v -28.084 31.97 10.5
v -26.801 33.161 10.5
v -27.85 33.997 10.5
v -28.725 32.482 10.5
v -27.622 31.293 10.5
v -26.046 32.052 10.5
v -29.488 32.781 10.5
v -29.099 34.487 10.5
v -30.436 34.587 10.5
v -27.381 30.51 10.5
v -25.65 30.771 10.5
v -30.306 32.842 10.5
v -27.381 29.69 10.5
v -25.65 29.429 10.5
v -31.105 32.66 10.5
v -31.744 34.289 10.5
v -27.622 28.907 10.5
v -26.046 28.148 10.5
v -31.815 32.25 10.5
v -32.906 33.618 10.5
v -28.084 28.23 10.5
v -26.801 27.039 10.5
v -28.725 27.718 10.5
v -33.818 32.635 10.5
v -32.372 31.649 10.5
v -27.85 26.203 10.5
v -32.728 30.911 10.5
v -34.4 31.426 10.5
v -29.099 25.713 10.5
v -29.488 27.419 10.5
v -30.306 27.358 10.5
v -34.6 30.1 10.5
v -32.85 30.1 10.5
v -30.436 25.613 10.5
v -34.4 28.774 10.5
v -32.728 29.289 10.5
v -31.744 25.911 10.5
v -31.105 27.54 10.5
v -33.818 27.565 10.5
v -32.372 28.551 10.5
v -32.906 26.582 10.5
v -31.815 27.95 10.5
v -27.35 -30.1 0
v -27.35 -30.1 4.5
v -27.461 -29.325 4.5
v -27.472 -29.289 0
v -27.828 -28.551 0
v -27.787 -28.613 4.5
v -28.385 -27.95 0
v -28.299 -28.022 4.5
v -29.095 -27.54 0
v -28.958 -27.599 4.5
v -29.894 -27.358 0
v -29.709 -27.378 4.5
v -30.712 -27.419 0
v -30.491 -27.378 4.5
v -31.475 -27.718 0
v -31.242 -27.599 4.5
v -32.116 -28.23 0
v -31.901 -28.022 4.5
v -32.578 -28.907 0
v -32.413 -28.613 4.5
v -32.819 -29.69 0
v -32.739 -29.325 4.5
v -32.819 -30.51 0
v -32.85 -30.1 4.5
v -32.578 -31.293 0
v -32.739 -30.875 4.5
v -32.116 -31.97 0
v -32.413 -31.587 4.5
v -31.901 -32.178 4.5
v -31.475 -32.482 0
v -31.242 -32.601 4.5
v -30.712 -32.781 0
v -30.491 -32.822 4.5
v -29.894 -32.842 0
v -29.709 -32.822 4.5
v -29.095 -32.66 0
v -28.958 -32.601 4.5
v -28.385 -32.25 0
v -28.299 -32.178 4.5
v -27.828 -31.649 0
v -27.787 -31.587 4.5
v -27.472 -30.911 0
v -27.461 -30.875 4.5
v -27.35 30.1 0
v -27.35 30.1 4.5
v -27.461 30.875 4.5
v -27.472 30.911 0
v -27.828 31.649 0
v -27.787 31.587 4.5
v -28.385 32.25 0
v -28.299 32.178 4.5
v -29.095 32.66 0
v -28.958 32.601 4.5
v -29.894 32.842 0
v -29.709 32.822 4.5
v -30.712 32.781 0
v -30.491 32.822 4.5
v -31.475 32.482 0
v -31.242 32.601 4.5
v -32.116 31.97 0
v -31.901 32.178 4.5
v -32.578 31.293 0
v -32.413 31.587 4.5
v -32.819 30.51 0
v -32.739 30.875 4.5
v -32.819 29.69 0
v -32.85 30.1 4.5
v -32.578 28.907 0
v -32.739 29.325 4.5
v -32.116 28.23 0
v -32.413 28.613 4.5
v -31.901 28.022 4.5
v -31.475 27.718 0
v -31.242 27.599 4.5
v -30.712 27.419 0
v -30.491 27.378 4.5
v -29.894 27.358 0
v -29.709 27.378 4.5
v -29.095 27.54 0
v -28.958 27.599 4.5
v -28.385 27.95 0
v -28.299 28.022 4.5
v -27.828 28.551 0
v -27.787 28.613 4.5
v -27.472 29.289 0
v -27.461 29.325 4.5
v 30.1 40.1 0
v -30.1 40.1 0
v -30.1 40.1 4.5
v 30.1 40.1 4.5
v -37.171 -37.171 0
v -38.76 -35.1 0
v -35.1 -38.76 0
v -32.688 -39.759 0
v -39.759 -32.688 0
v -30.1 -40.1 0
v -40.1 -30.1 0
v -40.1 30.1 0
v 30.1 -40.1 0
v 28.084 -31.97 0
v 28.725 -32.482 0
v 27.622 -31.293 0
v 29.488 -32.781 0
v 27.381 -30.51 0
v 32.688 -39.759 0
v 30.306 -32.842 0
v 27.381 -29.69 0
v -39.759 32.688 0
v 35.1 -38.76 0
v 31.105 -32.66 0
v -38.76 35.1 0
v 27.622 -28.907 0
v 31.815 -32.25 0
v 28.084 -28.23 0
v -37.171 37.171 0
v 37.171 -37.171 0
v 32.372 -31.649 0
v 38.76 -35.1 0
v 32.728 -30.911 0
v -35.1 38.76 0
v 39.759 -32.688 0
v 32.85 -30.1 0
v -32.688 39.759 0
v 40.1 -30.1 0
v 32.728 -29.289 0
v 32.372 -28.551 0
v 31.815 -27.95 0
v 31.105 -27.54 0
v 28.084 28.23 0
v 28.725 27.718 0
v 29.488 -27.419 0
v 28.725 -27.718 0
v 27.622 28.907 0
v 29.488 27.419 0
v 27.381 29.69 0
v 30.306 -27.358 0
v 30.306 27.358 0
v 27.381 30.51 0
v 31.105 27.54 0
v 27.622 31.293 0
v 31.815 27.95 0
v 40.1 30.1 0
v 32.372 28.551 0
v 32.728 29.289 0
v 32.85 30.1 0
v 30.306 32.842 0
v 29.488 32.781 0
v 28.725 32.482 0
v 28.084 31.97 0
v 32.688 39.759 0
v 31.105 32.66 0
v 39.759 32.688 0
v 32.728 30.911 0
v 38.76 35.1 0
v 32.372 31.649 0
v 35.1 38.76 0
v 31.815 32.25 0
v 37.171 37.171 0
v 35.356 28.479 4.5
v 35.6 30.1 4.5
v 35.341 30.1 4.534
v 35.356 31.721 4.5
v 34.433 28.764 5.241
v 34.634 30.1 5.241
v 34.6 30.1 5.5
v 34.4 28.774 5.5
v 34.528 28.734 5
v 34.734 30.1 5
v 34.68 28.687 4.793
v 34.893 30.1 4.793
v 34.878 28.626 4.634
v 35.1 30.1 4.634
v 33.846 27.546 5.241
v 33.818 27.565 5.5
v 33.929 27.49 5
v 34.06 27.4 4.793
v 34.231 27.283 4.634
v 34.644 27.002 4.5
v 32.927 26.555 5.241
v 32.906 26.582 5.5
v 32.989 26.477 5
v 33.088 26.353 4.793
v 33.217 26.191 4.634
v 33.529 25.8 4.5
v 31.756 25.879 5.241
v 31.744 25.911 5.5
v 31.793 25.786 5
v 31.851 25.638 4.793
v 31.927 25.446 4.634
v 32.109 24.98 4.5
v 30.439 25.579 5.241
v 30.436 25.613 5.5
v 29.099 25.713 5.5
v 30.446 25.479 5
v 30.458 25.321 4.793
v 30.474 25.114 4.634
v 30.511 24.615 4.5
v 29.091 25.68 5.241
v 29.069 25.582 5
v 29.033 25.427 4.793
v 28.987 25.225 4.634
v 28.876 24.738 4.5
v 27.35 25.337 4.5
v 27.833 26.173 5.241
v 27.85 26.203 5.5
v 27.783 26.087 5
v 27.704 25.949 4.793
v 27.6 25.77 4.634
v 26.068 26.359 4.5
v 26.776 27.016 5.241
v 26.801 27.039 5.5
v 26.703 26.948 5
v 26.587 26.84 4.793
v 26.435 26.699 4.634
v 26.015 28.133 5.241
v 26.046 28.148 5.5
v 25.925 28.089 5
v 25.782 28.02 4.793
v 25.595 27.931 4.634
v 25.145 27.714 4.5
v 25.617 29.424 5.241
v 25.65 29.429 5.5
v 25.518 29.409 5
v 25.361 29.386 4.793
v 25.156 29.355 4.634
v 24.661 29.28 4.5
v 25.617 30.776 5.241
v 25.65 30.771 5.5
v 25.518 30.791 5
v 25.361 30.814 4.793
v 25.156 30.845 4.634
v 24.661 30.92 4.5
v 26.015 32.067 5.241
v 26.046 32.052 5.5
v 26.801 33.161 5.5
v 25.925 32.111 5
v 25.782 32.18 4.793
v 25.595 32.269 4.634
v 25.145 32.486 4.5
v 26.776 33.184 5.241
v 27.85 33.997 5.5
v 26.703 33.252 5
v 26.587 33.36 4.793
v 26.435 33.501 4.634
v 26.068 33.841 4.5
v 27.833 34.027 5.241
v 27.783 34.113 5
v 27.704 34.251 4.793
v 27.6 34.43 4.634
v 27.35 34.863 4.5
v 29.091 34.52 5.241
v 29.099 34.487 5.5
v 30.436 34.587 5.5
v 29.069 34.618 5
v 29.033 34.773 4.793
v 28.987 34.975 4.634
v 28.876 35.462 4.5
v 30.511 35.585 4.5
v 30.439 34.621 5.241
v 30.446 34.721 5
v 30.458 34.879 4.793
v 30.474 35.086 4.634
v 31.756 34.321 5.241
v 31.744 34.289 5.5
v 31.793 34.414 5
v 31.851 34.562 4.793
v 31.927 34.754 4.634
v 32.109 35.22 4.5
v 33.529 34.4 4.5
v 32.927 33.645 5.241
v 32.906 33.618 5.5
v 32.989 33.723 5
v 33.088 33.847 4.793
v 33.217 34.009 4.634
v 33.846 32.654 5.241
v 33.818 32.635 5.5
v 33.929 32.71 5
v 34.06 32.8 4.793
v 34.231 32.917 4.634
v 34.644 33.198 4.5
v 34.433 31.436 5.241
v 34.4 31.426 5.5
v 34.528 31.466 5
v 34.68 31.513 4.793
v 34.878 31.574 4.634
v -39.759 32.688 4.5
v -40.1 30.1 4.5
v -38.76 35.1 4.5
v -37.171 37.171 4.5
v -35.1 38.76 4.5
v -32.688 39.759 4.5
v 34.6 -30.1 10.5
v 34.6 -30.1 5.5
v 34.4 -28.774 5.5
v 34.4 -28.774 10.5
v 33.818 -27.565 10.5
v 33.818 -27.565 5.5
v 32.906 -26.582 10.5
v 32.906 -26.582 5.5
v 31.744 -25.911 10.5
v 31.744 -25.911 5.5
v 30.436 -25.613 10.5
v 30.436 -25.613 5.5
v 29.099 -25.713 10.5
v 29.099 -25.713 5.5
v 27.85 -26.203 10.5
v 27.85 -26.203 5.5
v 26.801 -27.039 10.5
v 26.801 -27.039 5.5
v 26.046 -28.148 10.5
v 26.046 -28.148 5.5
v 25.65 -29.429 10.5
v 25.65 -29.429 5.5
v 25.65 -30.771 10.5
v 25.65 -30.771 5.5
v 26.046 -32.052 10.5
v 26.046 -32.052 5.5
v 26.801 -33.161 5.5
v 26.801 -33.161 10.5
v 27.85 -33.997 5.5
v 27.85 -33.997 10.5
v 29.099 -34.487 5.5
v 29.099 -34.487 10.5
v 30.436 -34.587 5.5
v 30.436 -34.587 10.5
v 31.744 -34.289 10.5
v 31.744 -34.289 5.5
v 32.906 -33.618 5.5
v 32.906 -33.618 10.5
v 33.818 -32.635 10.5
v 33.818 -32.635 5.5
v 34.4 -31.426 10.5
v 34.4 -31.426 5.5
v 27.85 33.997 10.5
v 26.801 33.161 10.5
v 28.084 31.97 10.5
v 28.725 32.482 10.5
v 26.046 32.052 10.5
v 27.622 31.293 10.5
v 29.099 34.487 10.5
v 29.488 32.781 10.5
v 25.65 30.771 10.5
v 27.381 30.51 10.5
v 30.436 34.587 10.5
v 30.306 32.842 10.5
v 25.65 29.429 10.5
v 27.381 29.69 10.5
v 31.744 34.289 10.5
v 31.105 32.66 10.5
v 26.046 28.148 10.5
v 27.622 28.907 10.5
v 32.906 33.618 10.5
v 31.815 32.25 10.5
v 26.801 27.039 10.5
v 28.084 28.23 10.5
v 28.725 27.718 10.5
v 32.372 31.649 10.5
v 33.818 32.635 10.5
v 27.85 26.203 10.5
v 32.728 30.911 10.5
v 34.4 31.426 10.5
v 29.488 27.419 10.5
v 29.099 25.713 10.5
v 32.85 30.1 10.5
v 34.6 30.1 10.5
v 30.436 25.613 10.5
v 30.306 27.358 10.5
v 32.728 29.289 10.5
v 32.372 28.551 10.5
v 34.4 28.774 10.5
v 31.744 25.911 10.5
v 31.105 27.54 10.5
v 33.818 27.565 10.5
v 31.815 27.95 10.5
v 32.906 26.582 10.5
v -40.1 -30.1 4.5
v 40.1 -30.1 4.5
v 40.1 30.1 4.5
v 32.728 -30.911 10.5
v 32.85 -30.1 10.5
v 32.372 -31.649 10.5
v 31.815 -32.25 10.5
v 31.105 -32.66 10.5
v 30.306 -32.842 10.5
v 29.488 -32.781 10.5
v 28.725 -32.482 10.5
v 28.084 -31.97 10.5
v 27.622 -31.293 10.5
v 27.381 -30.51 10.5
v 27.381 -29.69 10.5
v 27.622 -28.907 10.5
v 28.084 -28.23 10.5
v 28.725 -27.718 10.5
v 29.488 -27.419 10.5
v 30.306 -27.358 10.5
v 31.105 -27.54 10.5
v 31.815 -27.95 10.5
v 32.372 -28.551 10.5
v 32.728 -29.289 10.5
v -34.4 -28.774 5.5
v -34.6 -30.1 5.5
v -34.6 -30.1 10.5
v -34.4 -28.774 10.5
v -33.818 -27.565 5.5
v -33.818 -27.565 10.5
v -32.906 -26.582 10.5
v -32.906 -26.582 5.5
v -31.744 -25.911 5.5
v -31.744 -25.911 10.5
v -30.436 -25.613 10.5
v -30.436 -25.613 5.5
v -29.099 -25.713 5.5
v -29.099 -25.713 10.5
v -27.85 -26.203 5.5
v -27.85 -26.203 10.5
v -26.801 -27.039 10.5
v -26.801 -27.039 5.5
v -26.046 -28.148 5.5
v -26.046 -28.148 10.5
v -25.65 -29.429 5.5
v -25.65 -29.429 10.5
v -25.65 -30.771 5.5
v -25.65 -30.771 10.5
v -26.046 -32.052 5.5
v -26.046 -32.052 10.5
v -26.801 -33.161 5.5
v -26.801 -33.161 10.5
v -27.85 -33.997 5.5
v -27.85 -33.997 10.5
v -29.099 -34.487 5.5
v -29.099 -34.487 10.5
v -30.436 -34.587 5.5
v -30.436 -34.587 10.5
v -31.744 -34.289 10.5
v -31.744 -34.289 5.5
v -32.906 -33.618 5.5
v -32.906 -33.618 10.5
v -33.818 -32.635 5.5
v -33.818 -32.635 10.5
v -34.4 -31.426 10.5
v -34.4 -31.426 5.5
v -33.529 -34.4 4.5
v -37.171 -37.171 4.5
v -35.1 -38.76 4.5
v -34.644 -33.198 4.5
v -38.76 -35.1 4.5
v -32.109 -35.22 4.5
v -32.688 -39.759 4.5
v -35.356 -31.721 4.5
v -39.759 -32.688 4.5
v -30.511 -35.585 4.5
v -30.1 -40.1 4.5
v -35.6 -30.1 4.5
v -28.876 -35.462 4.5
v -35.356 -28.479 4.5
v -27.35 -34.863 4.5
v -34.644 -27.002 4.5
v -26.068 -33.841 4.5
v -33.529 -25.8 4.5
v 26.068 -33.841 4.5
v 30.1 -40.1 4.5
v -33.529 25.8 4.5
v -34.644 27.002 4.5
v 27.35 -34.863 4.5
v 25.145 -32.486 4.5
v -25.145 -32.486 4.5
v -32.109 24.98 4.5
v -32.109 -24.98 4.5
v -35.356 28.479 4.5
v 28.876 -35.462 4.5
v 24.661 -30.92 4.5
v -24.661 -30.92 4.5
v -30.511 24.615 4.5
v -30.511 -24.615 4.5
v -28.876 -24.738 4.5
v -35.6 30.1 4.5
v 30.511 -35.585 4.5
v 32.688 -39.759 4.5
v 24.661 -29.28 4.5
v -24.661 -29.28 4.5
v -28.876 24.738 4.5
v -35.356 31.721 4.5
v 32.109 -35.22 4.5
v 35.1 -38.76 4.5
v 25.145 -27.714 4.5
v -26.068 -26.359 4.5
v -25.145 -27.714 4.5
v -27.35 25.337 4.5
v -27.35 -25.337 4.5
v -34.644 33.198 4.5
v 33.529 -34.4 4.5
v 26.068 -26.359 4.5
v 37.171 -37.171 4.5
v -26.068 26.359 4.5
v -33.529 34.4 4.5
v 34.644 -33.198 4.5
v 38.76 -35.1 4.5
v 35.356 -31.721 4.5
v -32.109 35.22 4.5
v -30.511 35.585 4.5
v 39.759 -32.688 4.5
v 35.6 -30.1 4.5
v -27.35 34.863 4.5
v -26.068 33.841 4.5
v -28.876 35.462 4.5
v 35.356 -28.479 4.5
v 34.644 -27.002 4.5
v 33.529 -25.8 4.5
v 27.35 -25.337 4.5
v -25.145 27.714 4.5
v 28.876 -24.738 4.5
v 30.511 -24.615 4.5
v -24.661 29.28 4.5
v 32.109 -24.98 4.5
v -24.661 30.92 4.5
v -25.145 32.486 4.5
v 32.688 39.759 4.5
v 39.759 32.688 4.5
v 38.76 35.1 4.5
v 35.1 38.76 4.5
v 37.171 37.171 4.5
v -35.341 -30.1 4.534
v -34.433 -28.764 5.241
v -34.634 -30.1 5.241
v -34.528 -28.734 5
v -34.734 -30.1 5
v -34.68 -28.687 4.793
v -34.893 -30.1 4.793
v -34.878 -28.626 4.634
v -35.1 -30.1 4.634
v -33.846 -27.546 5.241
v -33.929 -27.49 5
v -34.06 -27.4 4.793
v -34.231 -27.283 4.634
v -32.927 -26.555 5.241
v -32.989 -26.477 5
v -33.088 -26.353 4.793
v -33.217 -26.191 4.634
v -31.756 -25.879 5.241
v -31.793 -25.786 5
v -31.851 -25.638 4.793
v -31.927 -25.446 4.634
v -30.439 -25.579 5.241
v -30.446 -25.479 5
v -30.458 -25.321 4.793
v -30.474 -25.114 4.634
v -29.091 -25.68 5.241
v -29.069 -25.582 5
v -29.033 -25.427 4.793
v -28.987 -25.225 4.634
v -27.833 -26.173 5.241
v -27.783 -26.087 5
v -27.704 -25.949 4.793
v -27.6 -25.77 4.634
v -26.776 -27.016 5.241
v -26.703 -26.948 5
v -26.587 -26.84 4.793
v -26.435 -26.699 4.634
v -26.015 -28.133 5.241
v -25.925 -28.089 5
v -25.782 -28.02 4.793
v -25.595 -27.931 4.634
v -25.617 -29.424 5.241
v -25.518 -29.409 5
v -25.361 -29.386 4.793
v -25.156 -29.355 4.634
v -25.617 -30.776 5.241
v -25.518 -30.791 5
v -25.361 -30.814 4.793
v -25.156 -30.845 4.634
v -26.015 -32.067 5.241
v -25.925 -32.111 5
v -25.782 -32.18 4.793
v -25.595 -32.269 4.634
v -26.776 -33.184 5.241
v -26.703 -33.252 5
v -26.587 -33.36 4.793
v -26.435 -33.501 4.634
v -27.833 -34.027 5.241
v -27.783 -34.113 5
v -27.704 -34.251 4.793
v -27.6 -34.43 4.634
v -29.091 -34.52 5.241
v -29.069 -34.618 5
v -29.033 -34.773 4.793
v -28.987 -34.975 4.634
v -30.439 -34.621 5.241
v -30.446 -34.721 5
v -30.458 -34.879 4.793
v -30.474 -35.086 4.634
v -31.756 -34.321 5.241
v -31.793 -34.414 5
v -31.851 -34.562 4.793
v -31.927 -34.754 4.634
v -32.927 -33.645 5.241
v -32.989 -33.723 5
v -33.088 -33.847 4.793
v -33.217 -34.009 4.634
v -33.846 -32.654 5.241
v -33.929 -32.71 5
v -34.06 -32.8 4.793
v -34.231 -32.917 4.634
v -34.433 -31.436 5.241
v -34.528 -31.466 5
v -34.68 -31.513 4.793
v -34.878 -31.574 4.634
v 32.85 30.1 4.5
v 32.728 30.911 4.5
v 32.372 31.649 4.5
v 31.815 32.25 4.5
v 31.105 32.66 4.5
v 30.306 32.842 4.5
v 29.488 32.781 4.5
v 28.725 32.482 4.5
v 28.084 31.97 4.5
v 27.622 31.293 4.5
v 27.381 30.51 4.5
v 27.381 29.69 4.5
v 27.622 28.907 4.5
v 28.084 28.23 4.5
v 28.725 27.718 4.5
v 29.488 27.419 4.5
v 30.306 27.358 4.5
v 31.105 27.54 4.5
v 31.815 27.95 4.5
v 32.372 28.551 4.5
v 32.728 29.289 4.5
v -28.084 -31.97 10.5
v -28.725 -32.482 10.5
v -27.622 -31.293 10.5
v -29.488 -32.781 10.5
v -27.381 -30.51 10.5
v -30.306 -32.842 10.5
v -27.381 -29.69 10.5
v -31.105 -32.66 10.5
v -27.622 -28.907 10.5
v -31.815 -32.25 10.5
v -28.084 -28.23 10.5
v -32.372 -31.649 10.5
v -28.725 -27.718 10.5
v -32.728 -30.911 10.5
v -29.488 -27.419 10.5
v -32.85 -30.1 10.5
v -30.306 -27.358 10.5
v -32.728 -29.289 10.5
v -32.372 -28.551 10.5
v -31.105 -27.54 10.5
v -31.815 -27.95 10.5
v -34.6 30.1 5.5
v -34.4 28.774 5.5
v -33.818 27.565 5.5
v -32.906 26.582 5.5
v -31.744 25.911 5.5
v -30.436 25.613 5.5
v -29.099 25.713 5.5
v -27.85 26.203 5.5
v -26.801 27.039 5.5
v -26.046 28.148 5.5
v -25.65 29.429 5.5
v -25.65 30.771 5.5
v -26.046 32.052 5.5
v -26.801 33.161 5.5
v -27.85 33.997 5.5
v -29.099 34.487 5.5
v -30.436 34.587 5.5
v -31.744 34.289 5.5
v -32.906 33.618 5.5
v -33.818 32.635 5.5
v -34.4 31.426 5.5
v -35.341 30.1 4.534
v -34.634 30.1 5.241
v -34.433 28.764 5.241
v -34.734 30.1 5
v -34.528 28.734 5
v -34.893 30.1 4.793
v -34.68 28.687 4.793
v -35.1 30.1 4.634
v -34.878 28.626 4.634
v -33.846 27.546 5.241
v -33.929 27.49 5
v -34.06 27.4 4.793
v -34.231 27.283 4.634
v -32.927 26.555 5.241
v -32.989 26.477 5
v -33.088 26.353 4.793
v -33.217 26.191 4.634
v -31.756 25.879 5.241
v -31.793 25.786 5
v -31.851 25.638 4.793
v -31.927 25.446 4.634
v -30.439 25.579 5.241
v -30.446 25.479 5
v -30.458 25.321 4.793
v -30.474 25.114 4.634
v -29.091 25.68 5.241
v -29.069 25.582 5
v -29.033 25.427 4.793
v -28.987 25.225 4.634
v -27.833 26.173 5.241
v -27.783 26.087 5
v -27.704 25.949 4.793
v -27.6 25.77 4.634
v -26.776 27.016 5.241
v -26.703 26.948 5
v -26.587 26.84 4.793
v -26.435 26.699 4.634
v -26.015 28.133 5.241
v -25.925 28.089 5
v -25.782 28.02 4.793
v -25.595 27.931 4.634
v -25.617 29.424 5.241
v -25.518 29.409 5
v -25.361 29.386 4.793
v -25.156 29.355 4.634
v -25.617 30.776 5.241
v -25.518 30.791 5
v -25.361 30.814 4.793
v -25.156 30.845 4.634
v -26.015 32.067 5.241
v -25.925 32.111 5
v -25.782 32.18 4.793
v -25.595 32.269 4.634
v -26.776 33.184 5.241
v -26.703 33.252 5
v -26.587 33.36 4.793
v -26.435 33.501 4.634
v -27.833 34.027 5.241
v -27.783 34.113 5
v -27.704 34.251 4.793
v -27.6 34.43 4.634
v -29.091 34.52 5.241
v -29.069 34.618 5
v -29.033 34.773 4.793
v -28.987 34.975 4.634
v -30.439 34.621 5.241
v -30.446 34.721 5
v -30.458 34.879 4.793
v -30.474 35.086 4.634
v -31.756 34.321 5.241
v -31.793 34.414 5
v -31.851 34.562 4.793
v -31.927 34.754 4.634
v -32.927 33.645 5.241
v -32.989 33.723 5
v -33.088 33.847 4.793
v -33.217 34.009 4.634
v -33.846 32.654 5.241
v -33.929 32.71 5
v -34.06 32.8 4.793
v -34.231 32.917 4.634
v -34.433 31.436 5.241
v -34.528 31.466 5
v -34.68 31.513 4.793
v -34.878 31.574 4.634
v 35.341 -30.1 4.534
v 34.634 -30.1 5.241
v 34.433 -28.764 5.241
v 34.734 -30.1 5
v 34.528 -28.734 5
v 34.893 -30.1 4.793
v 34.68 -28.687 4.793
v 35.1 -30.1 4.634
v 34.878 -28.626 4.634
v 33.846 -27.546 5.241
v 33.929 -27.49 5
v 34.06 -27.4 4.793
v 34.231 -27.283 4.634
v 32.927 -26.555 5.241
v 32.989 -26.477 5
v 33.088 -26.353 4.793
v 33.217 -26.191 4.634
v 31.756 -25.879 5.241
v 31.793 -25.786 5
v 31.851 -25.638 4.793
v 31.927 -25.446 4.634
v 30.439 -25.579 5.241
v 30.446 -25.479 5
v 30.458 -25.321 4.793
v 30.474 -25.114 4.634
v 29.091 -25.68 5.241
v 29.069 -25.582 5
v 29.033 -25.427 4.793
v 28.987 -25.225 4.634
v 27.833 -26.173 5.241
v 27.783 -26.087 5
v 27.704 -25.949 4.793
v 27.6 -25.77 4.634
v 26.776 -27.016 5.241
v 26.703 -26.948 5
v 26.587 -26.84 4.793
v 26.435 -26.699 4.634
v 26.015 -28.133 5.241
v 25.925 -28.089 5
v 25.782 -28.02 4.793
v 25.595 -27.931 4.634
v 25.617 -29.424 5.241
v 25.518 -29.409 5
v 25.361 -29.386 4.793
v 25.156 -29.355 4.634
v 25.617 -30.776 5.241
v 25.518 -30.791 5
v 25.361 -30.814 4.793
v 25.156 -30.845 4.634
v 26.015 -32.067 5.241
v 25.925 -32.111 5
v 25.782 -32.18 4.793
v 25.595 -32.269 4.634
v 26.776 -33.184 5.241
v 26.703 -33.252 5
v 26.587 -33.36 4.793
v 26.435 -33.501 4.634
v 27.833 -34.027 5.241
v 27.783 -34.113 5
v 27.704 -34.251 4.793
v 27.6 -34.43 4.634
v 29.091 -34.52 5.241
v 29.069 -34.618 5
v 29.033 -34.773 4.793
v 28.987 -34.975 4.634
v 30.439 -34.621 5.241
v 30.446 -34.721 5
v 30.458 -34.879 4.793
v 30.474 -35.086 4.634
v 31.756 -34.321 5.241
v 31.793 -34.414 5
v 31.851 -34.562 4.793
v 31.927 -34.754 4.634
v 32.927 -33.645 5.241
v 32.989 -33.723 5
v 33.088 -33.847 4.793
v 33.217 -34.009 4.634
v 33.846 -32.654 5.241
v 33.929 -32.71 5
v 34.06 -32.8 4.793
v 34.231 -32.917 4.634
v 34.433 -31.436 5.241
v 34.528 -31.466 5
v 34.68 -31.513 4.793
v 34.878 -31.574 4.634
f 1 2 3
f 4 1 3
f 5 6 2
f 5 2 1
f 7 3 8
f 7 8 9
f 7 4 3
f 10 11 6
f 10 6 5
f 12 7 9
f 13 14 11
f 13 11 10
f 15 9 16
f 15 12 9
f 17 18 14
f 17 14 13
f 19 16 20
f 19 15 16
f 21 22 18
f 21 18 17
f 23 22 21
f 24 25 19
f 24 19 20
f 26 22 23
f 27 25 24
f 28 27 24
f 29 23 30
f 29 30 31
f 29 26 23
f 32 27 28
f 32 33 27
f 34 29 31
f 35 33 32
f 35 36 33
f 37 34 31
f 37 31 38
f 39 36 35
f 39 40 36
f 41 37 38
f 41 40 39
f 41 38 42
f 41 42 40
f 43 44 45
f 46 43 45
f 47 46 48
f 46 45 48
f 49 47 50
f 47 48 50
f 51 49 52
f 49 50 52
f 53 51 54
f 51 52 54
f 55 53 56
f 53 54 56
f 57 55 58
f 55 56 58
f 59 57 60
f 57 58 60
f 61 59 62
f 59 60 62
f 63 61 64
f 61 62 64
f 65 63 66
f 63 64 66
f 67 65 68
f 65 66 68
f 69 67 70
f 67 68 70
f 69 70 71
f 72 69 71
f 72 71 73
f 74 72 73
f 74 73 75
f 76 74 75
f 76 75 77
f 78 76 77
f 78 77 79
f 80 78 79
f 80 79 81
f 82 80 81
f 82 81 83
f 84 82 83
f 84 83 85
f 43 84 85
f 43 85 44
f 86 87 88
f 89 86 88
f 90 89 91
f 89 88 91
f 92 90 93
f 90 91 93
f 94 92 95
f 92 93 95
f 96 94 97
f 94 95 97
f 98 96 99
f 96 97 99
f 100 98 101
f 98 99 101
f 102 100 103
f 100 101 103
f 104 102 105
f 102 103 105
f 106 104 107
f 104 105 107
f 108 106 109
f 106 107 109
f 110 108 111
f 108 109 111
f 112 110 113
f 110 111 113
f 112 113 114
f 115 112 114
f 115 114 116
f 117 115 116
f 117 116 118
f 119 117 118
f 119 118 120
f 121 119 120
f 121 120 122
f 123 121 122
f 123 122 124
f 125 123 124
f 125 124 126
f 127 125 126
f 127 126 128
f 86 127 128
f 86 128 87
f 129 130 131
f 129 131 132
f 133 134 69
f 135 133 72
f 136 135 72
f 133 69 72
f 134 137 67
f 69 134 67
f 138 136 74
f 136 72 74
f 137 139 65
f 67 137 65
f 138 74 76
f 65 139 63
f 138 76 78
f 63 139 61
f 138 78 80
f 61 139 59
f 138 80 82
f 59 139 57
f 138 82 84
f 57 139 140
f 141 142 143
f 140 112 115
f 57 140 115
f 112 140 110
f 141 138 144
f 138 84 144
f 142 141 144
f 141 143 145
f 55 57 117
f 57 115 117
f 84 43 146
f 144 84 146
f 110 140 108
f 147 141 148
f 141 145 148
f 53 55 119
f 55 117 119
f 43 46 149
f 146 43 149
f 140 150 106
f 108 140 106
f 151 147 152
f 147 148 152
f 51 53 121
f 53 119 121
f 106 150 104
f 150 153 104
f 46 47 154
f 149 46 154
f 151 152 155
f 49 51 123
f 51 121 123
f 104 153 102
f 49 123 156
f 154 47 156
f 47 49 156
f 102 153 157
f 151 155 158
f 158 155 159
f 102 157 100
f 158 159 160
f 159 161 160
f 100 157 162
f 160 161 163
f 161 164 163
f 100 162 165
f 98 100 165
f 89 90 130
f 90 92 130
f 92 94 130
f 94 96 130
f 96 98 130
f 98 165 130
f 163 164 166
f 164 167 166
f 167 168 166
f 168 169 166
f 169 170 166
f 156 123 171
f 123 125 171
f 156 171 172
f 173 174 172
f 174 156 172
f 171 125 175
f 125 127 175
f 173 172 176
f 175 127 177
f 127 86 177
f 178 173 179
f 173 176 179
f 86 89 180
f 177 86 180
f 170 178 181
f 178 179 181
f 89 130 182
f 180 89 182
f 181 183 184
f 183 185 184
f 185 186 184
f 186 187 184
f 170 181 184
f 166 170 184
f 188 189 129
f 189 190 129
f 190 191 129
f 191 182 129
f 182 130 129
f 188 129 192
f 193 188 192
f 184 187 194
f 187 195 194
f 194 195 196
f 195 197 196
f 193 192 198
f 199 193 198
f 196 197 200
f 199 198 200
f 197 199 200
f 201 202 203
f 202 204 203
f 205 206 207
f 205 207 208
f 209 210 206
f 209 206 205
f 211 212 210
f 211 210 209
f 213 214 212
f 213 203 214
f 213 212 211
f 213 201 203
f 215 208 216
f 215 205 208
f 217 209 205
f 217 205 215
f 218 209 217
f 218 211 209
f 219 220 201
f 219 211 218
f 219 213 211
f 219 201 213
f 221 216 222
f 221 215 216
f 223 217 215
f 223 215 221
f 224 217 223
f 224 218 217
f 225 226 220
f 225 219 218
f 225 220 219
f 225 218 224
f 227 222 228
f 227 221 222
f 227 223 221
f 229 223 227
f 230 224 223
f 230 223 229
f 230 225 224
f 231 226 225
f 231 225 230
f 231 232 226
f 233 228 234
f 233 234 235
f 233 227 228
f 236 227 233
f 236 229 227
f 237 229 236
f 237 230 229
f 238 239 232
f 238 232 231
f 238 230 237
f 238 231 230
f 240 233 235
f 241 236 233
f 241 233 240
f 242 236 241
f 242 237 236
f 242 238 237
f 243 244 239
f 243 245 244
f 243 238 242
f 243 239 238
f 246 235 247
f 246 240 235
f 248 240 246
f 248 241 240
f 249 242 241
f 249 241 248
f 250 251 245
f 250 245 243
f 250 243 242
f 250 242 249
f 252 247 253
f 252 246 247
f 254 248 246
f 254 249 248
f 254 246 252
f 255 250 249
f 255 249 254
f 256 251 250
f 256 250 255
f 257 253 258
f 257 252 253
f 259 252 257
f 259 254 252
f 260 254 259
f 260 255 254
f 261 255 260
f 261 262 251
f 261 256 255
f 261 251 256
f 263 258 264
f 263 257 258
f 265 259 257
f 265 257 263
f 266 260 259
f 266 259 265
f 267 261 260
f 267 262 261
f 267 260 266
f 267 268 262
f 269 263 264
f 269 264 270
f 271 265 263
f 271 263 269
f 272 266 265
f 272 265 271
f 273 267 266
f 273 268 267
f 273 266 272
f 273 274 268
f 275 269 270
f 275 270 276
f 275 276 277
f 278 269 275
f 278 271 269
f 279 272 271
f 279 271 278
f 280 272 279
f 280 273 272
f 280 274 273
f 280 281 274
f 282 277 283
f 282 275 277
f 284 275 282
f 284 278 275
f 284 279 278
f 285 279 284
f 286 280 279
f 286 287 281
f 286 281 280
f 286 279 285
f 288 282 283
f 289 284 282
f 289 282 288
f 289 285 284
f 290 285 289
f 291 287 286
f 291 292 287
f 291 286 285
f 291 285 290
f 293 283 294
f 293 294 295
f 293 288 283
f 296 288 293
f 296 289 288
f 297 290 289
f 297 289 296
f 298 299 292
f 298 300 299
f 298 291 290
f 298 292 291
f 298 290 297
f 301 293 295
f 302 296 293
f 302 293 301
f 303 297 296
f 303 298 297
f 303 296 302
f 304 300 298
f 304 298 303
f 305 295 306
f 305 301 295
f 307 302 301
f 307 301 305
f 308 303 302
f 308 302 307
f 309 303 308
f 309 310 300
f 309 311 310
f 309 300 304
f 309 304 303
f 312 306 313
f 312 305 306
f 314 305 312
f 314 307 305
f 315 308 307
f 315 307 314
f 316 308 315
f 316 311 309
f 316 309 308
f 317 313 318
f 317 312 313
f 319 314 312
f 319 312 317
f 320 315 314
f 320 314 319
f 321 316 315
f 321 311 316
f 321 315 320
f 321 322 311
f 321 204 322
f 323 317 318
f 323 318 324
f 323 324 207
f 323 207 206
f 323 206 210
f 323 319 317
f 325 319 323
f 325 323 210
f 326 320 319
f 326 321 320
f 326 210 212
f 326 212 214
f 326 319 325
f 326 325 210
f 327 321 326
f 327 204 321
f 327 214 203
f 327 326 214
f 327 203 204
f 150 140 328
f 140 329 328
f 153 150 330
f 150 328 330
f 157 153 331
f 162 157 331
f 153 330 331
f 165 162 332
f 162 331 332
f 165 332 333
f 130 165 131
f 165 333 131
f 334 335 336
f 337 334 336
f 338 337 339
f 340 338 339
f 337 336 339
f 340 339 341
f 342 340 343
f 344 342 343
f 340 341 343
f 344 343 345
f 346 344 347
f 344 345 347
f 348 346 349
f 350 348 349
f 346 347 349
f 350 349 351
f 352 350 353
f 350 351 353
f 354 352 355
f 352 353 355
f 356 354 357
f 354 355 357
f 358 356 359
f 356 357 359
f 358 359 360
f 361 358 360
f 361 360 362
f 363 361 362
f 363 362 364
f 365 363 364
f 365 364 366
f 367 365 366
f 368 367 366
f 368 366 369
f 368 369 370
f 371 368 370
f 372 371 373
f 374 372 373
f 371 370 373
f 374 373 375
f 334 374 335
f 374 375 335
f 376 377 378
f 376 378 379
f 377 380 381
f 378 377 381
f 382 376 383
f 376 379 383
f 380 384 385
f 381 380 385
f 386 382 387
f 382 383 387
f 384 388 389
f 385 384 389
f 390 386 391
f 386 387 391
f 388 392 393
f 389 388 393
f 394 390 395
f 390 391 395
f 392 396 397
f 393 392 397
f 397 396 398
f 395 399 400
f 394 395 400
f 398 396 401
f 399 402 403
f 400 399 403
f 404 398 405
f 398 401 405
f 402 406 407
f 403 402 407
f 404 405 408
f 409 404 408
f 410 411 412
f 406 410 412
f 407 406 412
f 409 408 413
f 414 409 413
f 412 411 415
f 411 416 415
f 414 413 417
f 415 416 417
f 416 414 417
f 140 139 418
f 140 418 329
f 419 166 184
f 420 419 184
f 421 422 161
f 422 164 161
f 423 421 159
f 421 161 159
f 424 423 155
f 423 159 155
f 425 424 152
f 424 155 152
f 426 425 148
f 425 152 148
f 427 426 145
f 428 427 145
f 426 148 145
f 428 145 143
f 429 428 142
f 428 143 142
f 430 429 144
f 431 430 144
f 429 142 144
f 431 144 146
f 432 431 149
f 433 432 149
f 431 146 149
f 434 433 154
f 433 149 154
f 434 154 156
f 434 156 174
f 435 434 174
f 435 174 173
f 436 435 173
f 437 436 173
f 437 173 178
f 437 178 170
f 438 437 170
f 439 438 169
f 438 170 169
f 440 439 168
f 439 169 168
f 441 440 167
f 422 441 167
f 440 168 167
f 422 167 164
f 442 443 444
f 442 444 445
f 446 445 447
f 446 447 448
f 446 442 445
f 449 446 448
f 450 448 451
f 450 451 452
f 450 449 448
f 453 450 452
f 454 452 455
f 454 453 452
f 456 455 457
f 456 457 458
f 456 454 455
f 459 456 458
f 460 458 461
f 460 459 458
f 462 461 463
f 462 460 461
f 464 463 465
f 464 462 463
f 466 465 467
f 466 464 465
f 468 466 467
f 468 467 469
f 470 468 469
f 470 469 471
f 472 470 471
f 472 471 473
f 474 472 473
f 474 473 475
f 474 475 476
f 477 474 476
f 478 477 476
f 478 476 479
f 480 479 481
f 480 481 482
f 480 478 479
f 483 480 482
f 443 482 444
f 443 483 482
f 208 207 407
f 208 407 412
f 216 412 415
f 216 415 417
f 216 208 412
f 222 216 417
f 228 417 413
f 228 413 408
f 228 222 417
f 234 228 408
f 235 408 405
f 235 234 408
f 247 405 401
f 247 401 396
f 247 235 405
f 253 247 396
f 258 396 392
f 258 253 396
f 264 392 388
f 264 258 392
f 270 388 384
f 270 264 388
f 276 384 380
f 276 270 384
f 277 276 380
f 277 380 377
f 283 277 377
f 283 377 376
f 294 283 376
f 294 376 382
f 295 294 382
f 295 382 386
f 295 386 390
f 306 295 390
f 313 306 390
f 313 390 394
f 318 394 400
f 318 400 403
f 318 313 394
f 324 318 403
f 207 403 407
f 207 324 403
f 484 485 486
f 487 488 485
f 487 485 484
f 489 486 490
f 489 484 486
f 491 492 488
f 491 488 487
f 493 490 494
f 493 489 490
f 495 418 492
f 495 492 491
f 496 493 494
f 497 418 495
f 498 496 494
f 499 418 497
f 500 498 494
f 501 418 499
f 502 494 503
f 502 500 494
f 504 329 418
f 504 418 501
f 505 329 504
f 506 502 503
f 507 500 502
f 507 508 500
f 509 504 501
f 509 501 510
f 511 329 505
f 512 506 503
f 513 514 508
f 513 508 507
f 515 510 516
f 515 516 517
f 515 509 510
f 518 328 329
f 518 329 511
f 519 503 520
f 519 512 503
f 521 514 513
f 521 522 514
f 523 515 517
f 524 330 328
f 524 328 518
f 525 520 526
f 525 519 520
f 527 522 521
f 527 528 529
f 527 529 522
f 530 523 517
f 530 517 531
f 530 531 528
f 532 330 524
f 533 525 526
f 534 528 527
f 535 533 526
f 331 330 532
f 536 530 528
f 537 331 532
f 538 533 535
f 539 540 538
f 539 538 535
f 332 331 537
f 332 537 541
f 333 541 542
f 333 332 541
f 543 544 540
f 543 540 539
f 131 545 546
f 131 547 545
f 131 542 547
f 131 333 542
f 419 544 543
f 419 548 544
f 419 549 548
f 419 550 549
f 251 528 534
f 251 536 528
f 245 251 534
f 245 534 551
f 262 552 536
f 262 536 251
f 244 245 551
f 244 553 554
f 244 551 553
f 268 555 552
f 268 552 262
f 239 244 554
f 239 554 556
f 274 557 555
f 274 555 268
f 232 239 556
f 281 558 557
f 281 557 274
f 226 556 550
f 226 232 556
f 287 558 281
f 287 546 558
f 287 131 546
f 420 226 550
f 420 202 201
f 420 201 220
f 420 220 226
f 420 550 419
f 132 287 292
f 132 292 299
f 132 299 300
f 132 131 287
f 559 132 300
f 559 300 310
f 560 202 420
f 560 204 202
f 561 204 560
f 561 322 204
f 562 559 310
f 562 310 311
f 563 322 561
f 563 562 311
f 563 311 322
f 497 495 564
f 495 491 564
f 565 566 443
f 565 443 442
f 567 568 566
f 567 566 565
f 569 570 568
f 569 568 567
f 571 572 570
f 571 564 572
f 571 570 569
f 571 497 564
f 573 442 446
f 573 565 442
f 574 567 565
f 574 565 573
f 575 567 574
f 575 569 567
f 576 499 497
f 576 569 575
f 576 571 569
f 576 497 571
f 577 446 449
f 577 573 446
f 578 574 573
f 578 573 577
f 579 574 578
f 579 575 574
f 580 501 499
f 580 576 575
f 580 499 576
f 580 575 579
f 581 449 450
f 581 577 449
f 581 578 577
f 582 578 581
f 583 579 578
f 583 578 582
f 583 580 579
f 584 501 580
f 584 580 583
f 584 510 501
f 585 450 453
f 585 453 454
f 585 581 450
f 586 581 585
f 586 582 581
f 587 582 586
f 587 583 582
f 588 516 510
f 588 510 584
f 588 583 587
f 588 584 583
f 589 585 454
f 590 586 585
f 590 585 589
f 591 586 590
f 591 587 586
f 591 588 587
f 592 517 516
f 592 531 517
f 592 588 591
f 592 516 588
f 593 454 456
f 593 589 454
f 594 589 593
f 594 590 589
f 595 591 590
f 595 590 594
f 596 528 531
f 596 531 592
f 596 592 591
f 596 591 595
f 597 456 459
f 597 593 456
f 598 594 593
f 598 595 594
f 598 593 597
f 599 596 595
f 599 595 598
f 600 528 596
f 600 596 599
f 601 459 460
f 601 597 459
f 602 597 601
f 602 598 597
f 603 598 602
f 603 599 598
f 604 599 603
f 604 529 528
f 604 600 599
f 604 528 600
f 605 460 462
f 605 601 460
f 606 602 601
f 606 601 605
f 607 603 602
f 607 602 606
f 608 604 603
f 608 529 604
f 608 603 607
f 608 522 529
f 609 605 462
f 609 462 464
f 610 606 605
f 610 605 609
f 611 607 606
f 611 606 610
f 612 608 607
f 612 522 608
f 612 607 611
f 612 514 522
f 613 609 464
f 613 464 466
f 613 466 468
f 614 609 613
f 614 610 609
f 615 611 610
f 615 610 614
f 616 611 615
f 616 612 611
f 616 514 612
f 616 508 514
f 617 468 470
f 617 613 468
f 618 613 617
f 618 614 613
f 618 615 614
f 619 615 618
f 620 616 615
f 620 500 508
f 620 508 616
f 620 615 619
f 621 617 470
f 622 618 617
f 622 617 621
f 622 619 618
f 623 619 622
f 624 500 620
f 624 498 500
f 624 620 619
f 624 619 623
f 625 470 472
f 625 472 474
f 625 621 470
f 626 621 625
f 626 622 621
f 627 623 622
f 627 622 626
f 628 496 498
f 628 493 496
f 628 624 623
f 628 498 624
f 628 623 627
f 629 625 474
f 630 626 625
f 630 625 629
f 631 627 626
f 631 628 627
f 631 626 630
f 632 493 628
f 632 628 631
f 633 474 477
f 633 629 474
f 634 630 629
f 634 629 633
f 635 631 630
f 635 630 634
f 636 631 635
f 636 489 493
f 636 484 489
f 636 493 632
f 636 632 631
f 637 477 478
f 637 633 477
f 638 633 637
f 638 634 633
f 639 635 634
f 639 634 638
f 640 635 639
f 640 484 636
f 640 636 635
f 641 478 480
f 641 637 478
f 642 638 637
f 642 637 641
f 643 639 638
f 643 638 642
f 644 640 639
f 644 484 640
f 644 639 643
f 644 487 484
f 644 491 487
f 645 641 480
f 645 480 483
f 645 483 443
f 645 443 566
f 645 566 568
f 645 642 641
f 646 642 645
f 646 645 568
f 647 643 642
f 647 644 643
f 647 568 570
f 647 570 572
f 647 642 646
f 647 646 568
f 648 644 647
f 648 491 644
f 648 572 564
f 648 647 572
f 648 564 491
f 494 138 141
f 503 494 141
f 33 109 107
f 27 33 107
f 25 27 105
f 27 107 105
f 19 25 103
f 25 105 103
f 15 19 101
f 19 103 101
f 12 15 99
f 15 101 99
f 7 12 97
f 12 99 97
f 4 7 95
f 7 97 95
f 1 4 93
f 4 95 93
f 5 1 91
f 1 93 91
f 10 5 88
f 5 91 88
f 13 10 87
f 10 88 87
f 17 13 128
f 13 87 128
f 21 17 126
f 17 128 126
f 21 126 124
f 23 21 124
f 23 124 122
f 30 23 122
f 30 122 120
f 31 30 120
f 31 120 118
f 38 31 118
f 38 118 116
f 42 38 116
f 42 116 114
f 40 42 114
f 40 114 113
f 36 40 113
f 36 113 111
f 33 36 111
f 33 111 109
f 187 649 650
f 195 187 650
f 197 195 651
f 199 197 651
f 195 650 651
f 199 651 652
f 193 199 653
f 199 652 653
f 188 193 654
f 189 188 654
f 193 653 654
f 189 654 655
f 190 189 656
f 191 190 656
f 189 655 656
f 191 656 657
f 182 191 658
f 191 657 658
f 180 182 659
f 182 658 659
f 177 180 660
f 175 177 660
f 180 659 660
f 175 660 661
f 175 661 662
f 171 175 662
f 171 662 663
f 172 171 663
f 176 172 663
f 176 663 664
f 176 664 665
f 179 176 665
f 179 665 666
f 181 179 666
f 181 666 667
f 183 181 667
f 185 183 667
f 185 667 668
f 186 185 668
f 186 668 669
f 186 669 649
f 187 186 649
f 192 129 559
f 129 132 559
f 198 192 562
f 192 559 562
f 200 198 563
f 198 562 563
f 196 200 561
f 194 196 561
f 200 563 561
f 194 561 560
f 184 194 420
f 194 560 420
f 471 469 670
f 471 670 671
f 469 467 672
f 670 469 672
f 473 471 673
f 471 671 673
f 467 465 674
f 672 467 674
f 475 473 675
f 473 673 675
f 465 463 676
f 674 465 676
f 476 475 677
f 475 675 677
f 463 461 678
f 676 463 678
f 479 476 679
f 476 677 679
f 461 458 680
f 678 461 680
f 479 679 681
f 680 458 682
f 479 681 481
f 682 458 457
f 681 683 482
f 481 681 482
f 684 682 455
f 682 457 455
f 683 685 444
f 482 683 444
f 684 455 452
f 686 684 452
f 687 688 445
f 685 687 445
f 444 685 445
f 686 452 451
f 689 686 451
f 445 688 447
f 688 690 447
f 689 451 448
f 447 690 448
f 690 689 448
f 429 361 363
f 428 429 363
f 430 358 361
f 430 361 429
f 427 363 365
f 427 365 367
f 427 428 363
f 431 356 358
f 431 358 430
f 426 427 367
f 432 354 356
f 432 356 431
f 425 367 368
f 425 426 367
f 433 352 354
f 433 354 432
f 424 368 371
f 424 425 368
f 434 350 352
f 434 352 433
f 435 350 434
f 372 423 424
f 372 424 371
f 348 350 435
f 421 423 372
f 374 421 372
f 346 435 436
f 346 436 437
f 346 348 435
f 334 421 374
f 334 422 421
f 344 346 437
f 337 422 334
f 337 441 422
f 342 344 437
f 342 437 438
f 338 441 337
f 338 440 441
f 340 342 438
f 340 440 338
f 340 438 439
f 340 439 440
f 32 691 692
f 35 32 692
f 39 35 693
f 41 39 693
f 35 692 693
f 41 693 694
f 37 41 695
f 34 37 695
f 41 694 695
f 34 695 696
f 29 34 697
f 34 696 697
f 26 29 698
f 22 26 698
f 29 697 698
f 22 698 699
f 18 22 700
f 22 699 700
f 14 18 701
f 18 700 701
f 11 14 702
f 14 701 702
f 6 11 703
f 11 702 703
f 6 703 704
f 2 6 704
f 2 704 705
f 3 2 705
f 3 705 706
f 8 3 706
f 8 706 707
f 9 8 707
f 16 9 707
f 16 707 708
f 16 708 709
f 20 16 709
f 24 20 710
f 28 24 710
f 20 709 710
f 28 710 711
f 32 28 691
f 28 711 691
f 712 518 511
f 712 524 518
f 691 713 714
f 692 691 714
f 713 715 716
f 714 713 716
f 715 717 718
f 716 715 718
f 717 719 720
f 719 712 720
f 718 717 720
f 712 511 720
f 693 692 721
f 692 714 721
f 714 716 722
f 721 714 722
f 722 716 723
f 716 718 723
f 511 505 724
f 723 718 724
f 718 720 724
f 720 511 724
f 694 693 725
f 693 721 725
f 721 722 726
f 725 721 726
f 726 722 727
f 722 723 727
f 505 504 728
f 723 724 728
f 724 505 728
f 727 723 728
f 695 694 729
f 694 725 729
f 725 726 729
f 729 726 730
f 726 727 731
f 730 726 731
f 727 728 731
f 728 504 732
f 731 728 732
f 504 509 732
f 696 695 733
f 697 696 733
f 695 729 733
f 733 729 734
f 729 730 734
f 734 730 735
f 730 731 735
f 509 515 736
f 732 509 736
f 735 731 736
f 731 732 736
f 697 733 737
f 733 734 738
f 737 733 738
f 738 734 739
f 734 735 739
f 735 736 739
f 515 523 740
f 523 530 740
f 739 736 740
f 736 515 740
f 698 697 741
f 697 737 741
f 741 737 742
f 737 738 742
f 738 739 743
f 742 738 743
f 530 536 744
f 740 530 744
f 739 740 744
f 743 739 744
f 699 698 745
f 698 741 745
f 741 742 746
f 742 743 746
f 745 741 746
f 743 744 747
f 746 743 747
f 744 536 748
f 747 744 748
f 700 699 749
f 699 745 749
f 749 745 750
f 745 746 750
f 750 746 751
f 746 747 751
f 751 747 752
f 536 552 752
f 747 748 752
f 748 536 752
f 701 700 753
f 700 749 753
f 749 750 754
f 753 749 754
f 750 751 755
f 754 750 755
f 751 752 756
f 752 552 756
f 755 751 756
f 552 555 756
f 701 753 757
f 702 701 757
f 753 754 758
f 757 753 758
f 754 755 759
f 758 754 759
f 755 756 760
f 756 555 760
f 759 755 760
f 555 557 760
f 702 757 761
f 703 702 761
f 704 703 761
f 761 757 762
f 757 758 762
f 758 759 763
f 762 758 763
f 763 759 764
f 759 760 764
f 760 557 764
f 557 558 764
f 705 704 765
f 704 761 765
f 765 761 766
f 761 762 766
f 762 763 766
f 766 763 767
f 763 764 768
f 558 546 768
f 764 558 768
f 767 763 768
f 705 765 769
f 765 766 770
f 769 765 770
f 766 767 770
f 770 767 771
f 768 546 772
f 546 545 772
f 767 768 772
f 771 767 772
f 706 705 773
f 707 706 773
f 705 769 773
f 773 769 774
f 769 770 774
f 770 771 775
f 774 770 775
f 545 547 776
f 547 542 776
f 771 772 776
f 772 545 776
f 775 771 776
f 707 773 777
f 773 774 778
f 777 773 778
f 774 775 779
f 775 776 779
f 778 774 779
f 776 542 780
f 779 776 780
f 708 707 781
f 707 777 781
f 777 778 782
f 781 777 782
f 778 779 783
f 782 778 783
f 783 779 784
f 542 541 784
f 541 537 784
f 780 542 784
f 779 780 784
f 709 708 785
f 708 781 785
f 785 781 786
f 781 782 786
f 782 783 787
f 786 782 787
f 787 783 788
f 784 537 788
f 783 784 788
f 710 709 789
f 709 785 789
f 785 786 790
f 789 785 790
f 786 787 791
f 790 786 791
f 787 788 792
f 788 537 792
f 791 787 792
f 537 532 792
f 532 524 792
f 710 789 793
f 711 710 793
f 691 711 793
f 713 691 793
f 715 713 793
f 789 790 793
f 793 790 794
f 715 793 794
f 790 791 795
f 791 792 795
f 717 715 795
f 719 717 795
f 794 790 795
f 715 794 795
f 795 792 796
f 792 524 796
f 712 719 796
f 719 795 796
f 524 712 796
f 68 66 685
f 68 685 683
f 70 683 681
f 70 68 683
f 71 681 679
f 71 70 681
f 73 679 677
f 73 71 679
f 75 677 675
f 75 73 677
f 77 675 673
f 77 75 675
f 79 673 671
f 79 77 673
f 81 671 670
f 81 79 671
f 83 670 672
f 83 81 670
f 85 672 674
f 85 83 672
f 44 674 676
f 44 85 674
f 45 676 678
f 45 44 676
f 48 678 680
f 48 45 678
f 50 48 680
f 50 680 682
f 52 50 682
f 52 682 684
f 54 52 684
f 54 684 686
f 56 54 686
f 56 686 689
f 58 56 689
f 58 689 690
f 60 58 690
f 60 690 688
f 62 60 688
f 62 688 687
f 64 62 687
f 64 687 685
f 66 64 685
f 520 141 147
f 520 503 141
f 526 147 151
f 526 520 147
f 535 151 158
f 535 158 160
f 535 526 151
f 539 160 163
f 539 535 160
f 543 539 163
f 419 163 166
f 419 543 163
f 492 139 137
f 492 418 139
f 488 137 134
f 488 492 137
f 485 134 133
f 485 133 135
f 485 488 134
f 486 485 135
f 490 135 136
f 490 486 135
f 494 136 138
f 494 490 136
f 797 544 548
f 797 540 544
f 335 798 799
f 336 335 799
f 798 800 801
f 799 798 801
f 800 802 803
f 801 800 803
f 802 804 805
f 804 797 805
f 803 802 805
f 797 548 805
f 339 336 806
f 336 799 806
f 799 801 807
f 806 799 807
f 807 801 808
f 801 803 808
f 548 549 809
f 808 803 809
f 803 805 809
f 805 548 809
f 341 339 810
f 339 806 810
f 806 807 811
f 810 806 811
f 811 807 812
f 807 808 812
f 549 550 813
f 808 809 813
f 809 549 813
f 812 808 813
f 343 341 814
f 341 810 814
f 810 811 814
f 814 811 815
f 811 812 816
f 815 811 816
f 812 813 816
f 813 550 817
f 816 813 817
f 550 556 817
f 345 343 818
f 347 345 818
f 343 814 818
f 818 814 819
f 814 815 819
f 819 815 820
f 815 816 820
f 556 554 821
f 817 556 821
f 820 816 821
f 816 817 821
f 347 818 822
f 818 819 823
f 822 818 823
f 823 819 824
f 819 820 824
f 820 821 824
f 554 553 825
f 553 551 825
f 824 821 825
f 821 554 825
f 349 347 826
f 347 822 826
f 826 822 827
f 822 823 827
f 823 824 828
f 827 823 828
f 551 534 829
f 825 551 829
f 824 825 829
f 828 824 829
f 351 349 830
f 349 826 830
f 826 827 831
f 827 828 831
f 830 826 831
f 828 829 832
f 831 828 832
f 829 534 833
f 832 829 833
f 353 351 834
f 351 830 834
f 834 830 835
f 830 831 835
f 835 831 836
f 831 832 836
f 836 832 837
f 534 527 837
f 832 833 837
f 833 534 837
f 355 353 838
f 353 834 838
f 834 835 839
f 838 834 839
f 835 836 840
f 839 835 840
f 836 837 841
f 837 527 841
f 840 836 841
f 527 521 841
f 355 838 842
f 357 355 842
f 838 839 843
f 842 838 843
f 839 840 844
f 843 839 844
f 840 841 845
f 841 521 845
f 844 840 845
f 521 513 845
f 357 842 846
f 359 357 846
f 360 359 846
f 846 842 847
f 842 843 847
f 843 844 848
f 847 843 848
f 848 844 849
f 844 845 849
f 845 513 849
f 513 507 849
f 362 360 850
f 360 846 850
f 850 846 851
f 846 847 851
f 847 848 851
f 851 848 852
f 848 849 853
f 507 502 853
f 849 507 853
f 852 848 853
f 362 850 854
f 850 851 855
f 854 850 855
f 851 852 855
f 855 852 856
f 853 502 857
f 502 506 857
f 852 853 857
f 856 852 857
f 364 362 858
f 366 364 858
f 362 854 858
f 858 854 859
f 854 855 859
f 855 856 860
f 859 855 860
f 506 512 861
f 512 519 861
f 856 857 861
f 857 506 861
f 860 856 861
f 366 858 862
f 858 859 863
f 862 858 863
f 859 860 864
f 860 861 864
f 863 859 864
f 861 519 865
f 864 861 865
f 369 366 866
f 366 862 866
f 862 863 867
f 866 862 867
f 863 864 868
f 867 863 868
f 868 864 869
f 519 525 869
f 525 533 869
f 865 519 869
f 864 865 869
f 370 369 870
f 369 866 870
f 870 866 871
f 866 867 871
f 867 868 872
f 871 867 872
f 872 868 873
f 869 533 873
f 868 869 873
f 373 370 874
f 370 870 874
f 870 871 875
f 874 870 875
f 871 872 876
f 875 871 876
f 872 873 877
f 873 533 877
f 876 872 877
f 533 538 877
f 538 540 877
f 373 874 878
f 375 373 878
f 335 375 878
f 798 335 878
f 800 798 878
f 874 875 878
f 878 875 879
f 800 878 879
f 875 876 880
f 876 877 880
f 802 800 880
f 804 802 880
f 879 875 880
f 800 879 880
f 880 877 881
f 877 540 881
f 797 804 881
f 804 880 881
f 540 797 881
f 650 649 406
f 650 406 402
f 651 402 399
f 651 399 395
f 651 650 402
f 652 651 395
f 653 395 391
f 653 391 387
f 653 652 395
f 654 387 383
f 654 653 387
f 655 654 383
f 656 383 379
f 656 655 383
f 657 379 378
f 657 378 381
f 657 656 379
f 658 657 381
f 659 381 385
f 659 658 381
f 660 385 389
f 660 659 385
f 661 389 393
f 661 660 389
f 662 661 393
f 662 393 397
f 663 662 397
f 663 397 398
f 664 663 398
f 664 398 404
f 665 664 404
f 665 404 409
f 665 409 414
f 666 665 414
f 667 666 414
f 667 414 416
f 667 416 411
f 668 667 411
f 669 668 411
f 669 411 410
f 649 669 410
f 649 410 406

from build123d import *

# Parameters (mm, degrees)
SKETCH1_W                                  = 80.2
SKETCH1_H                                  = 80.2
BOSS_EXTRUDE1_DEPTH                        = 4.5
M5_CLEARANCE_HOLE1_D                       = 5.5
FILLET2_R                                  = 10
SKETCH3_R                                  = 4.5
BOSS_EXTRUDE2_DEPTH                        = 6
CUT_EXTRUDE1_REACH                         = 59.026
SKETCH5_R                                  = 2.75
MIRROR2_AT_THE_SECOND_PLANE_COPY_1_SKETC_R = 4.5
MIRROR2_AT_THE_SECOND_PLANE_COPY_1_DEPTH   = 6
MIRROR2_AT_THE_SECOND_PLANE_COPY_2_REACH   = 59.026
MIRROR2_AT_THE_SECOND_PLANE_COPY_2_SKETC_R = 2.75
FILLET4_R                                  = 1


with BuildPart() as part:
    # Sketch1 → Boss-Extrude1 (new body)
    with BuildSketch(Plane.XY):
        Rectangle(SKETCH1_W, SKETCH1_H)
    extrude(amount=BOSS_EXTRUDE1_DEPTH)

    # M5 Clearance Hole1 (through all)
    with Locations(Plane(origin=(-30.1, -30.1, 0), x_dir=(-1, 0, 0), z_dir=(0, 0, -1))):
        with Locations((0, 0), (-60.2, 60.2), (0, 60.2), (-60.2, 0)):
            Hole(M5_CLEARANCE_HOLE1_D / 2)

    # Fillet2
    fillet2_edges = [part.edges().sort_by_distance(p)[0] for p in [
        (40.1, -40.1, 2.25),
        (-40.1, -40.1, 2.25),
        (-40.1, 40.1, 2.25),
        (40.1, 40.1, 2.25),
    ]]
    fillet(fillet2_edges, radius=FILLET2_R)

    # Sketch3 → Boss-Extrude2 (add)
    with BuildSketch(Plane.XY.offset(4.5)):
        with Locations(Location((-30.1, 30.1, 0), (0, 0, 180))):
            Circle(SKETCH3_R)
    boss_extrude2 = extrude(amount=BOSS_EXTRUDE2_DEPTH)

    # Sketch5 → Cut-Extrude1 (cut, up to next)
    with BuildSketch(Plane(origin=(0, 0, 4.5), x_dir=(-1, 0, 0), z_dir=(0, 0, -1)), mode=Mode.PRIVATE) as cut_extrude1_sk1:
        with Locations((30.1, 30.1)):
            Circle(SKETCH5_R)
    cut_extrude1_tool1 = extrude(cut_extrude1_sk1.sketch, amount=-CUT_EXTRUDE1_REACH, mode=Mode.PRIVATE) & part.part
    cut_extrude1 = cut_extrude1_tool1.solids().sort_by_distance((-30.1, 30.1, 4.5))[0]
    add(cut_extrude1, mode=Mode.SUBTRACT)

    # Mirror2: Boss-Extrude2, Cut-Extrude1 across plane
    add(boss_extrude2.mirror(Plane.ZX))
    add(cut_extrude1.mirror(Plane.ZX), mode=Mode.SUBTRACT)

    # Mirror2 at the second plane: Boss-Extrude2, Cut-Extrude1 across plane
    add(boss_extrude2.mirror(Plane(origin=(0, 0, 0), x_dir=(0, 0, 1), z_dir=(1, 0, 0))))
    add(cut_extrude1.mirror(Plane(origin=(0, 0, 0), x_dir=(0, 0, 1), z_dir=(1, 0, 0))), mode=Mode.SUBTRACT)

    # Mirror2 at the second plane copy 1 sketc → Mirror2 at the second plane copy 1 (add)
    with BuildSketch(Plane(origin=(0, 0, 4.5), x_dir=(-1, 0, 0), z_dir=(0, 0, 1))):
        with Locations(Location((-30.1, 30.1, 0), (0, 0, 180))):
            Circle(MIRROR2_AT_THE_SECOND_PLANE_COPY_1_SKETC_R)
    extrude(amount=MIRROR2_AT_THE_SECOND_PLANE_COPY_1_DEPTH)

    # Mirror2 at the second plane copy 2 sketc → Mirror2 at the second plane copy 2 (cut, up to next)
    with BuildSketch(Plane(origin=(0, 0, 4.5), x_dir=(1, 0, 0), z_dir=(0, 0, -1)), mode=Mode.PRIVATE) as mirror2_at_the_second_plane_copy_2_sk1:
        with Locations((30.1, 30.1)):
            Circle(MIRROR2_AT_THE_SECOND_PLANE_COPY_2_SKETC_R)
    mirror2_at_the_second_plane_copy_2_tool1 = extrude(mirror2_at_the_second_plane_copy_2_sk1.sketch, amount=-MIRROR2_AT_THE_SECOND_PLANE_COPY_2_REACH, mode=Mode.PRIVATE) & part.part
    add(mirror2_at_the_second_plane_copy_2_tool1.solids().sort_by_distance((30.1, -30.1, 4.5))[0], mode=Mode.SUBTRACT)

    # Fillet4
    fillet4_edges = [part.edges().sort_by_distance(p)[0] for p in [
        (-25.6, 30.1, 4.5),
        (25.6, 30.1, 4.5),
        (-25.6, -30.1, 4.5),
        (25.6, -30.1, 4.5),
    ]]
    fillet(fillet4_edges, radius=FILLET4_R)


solid = part.part
